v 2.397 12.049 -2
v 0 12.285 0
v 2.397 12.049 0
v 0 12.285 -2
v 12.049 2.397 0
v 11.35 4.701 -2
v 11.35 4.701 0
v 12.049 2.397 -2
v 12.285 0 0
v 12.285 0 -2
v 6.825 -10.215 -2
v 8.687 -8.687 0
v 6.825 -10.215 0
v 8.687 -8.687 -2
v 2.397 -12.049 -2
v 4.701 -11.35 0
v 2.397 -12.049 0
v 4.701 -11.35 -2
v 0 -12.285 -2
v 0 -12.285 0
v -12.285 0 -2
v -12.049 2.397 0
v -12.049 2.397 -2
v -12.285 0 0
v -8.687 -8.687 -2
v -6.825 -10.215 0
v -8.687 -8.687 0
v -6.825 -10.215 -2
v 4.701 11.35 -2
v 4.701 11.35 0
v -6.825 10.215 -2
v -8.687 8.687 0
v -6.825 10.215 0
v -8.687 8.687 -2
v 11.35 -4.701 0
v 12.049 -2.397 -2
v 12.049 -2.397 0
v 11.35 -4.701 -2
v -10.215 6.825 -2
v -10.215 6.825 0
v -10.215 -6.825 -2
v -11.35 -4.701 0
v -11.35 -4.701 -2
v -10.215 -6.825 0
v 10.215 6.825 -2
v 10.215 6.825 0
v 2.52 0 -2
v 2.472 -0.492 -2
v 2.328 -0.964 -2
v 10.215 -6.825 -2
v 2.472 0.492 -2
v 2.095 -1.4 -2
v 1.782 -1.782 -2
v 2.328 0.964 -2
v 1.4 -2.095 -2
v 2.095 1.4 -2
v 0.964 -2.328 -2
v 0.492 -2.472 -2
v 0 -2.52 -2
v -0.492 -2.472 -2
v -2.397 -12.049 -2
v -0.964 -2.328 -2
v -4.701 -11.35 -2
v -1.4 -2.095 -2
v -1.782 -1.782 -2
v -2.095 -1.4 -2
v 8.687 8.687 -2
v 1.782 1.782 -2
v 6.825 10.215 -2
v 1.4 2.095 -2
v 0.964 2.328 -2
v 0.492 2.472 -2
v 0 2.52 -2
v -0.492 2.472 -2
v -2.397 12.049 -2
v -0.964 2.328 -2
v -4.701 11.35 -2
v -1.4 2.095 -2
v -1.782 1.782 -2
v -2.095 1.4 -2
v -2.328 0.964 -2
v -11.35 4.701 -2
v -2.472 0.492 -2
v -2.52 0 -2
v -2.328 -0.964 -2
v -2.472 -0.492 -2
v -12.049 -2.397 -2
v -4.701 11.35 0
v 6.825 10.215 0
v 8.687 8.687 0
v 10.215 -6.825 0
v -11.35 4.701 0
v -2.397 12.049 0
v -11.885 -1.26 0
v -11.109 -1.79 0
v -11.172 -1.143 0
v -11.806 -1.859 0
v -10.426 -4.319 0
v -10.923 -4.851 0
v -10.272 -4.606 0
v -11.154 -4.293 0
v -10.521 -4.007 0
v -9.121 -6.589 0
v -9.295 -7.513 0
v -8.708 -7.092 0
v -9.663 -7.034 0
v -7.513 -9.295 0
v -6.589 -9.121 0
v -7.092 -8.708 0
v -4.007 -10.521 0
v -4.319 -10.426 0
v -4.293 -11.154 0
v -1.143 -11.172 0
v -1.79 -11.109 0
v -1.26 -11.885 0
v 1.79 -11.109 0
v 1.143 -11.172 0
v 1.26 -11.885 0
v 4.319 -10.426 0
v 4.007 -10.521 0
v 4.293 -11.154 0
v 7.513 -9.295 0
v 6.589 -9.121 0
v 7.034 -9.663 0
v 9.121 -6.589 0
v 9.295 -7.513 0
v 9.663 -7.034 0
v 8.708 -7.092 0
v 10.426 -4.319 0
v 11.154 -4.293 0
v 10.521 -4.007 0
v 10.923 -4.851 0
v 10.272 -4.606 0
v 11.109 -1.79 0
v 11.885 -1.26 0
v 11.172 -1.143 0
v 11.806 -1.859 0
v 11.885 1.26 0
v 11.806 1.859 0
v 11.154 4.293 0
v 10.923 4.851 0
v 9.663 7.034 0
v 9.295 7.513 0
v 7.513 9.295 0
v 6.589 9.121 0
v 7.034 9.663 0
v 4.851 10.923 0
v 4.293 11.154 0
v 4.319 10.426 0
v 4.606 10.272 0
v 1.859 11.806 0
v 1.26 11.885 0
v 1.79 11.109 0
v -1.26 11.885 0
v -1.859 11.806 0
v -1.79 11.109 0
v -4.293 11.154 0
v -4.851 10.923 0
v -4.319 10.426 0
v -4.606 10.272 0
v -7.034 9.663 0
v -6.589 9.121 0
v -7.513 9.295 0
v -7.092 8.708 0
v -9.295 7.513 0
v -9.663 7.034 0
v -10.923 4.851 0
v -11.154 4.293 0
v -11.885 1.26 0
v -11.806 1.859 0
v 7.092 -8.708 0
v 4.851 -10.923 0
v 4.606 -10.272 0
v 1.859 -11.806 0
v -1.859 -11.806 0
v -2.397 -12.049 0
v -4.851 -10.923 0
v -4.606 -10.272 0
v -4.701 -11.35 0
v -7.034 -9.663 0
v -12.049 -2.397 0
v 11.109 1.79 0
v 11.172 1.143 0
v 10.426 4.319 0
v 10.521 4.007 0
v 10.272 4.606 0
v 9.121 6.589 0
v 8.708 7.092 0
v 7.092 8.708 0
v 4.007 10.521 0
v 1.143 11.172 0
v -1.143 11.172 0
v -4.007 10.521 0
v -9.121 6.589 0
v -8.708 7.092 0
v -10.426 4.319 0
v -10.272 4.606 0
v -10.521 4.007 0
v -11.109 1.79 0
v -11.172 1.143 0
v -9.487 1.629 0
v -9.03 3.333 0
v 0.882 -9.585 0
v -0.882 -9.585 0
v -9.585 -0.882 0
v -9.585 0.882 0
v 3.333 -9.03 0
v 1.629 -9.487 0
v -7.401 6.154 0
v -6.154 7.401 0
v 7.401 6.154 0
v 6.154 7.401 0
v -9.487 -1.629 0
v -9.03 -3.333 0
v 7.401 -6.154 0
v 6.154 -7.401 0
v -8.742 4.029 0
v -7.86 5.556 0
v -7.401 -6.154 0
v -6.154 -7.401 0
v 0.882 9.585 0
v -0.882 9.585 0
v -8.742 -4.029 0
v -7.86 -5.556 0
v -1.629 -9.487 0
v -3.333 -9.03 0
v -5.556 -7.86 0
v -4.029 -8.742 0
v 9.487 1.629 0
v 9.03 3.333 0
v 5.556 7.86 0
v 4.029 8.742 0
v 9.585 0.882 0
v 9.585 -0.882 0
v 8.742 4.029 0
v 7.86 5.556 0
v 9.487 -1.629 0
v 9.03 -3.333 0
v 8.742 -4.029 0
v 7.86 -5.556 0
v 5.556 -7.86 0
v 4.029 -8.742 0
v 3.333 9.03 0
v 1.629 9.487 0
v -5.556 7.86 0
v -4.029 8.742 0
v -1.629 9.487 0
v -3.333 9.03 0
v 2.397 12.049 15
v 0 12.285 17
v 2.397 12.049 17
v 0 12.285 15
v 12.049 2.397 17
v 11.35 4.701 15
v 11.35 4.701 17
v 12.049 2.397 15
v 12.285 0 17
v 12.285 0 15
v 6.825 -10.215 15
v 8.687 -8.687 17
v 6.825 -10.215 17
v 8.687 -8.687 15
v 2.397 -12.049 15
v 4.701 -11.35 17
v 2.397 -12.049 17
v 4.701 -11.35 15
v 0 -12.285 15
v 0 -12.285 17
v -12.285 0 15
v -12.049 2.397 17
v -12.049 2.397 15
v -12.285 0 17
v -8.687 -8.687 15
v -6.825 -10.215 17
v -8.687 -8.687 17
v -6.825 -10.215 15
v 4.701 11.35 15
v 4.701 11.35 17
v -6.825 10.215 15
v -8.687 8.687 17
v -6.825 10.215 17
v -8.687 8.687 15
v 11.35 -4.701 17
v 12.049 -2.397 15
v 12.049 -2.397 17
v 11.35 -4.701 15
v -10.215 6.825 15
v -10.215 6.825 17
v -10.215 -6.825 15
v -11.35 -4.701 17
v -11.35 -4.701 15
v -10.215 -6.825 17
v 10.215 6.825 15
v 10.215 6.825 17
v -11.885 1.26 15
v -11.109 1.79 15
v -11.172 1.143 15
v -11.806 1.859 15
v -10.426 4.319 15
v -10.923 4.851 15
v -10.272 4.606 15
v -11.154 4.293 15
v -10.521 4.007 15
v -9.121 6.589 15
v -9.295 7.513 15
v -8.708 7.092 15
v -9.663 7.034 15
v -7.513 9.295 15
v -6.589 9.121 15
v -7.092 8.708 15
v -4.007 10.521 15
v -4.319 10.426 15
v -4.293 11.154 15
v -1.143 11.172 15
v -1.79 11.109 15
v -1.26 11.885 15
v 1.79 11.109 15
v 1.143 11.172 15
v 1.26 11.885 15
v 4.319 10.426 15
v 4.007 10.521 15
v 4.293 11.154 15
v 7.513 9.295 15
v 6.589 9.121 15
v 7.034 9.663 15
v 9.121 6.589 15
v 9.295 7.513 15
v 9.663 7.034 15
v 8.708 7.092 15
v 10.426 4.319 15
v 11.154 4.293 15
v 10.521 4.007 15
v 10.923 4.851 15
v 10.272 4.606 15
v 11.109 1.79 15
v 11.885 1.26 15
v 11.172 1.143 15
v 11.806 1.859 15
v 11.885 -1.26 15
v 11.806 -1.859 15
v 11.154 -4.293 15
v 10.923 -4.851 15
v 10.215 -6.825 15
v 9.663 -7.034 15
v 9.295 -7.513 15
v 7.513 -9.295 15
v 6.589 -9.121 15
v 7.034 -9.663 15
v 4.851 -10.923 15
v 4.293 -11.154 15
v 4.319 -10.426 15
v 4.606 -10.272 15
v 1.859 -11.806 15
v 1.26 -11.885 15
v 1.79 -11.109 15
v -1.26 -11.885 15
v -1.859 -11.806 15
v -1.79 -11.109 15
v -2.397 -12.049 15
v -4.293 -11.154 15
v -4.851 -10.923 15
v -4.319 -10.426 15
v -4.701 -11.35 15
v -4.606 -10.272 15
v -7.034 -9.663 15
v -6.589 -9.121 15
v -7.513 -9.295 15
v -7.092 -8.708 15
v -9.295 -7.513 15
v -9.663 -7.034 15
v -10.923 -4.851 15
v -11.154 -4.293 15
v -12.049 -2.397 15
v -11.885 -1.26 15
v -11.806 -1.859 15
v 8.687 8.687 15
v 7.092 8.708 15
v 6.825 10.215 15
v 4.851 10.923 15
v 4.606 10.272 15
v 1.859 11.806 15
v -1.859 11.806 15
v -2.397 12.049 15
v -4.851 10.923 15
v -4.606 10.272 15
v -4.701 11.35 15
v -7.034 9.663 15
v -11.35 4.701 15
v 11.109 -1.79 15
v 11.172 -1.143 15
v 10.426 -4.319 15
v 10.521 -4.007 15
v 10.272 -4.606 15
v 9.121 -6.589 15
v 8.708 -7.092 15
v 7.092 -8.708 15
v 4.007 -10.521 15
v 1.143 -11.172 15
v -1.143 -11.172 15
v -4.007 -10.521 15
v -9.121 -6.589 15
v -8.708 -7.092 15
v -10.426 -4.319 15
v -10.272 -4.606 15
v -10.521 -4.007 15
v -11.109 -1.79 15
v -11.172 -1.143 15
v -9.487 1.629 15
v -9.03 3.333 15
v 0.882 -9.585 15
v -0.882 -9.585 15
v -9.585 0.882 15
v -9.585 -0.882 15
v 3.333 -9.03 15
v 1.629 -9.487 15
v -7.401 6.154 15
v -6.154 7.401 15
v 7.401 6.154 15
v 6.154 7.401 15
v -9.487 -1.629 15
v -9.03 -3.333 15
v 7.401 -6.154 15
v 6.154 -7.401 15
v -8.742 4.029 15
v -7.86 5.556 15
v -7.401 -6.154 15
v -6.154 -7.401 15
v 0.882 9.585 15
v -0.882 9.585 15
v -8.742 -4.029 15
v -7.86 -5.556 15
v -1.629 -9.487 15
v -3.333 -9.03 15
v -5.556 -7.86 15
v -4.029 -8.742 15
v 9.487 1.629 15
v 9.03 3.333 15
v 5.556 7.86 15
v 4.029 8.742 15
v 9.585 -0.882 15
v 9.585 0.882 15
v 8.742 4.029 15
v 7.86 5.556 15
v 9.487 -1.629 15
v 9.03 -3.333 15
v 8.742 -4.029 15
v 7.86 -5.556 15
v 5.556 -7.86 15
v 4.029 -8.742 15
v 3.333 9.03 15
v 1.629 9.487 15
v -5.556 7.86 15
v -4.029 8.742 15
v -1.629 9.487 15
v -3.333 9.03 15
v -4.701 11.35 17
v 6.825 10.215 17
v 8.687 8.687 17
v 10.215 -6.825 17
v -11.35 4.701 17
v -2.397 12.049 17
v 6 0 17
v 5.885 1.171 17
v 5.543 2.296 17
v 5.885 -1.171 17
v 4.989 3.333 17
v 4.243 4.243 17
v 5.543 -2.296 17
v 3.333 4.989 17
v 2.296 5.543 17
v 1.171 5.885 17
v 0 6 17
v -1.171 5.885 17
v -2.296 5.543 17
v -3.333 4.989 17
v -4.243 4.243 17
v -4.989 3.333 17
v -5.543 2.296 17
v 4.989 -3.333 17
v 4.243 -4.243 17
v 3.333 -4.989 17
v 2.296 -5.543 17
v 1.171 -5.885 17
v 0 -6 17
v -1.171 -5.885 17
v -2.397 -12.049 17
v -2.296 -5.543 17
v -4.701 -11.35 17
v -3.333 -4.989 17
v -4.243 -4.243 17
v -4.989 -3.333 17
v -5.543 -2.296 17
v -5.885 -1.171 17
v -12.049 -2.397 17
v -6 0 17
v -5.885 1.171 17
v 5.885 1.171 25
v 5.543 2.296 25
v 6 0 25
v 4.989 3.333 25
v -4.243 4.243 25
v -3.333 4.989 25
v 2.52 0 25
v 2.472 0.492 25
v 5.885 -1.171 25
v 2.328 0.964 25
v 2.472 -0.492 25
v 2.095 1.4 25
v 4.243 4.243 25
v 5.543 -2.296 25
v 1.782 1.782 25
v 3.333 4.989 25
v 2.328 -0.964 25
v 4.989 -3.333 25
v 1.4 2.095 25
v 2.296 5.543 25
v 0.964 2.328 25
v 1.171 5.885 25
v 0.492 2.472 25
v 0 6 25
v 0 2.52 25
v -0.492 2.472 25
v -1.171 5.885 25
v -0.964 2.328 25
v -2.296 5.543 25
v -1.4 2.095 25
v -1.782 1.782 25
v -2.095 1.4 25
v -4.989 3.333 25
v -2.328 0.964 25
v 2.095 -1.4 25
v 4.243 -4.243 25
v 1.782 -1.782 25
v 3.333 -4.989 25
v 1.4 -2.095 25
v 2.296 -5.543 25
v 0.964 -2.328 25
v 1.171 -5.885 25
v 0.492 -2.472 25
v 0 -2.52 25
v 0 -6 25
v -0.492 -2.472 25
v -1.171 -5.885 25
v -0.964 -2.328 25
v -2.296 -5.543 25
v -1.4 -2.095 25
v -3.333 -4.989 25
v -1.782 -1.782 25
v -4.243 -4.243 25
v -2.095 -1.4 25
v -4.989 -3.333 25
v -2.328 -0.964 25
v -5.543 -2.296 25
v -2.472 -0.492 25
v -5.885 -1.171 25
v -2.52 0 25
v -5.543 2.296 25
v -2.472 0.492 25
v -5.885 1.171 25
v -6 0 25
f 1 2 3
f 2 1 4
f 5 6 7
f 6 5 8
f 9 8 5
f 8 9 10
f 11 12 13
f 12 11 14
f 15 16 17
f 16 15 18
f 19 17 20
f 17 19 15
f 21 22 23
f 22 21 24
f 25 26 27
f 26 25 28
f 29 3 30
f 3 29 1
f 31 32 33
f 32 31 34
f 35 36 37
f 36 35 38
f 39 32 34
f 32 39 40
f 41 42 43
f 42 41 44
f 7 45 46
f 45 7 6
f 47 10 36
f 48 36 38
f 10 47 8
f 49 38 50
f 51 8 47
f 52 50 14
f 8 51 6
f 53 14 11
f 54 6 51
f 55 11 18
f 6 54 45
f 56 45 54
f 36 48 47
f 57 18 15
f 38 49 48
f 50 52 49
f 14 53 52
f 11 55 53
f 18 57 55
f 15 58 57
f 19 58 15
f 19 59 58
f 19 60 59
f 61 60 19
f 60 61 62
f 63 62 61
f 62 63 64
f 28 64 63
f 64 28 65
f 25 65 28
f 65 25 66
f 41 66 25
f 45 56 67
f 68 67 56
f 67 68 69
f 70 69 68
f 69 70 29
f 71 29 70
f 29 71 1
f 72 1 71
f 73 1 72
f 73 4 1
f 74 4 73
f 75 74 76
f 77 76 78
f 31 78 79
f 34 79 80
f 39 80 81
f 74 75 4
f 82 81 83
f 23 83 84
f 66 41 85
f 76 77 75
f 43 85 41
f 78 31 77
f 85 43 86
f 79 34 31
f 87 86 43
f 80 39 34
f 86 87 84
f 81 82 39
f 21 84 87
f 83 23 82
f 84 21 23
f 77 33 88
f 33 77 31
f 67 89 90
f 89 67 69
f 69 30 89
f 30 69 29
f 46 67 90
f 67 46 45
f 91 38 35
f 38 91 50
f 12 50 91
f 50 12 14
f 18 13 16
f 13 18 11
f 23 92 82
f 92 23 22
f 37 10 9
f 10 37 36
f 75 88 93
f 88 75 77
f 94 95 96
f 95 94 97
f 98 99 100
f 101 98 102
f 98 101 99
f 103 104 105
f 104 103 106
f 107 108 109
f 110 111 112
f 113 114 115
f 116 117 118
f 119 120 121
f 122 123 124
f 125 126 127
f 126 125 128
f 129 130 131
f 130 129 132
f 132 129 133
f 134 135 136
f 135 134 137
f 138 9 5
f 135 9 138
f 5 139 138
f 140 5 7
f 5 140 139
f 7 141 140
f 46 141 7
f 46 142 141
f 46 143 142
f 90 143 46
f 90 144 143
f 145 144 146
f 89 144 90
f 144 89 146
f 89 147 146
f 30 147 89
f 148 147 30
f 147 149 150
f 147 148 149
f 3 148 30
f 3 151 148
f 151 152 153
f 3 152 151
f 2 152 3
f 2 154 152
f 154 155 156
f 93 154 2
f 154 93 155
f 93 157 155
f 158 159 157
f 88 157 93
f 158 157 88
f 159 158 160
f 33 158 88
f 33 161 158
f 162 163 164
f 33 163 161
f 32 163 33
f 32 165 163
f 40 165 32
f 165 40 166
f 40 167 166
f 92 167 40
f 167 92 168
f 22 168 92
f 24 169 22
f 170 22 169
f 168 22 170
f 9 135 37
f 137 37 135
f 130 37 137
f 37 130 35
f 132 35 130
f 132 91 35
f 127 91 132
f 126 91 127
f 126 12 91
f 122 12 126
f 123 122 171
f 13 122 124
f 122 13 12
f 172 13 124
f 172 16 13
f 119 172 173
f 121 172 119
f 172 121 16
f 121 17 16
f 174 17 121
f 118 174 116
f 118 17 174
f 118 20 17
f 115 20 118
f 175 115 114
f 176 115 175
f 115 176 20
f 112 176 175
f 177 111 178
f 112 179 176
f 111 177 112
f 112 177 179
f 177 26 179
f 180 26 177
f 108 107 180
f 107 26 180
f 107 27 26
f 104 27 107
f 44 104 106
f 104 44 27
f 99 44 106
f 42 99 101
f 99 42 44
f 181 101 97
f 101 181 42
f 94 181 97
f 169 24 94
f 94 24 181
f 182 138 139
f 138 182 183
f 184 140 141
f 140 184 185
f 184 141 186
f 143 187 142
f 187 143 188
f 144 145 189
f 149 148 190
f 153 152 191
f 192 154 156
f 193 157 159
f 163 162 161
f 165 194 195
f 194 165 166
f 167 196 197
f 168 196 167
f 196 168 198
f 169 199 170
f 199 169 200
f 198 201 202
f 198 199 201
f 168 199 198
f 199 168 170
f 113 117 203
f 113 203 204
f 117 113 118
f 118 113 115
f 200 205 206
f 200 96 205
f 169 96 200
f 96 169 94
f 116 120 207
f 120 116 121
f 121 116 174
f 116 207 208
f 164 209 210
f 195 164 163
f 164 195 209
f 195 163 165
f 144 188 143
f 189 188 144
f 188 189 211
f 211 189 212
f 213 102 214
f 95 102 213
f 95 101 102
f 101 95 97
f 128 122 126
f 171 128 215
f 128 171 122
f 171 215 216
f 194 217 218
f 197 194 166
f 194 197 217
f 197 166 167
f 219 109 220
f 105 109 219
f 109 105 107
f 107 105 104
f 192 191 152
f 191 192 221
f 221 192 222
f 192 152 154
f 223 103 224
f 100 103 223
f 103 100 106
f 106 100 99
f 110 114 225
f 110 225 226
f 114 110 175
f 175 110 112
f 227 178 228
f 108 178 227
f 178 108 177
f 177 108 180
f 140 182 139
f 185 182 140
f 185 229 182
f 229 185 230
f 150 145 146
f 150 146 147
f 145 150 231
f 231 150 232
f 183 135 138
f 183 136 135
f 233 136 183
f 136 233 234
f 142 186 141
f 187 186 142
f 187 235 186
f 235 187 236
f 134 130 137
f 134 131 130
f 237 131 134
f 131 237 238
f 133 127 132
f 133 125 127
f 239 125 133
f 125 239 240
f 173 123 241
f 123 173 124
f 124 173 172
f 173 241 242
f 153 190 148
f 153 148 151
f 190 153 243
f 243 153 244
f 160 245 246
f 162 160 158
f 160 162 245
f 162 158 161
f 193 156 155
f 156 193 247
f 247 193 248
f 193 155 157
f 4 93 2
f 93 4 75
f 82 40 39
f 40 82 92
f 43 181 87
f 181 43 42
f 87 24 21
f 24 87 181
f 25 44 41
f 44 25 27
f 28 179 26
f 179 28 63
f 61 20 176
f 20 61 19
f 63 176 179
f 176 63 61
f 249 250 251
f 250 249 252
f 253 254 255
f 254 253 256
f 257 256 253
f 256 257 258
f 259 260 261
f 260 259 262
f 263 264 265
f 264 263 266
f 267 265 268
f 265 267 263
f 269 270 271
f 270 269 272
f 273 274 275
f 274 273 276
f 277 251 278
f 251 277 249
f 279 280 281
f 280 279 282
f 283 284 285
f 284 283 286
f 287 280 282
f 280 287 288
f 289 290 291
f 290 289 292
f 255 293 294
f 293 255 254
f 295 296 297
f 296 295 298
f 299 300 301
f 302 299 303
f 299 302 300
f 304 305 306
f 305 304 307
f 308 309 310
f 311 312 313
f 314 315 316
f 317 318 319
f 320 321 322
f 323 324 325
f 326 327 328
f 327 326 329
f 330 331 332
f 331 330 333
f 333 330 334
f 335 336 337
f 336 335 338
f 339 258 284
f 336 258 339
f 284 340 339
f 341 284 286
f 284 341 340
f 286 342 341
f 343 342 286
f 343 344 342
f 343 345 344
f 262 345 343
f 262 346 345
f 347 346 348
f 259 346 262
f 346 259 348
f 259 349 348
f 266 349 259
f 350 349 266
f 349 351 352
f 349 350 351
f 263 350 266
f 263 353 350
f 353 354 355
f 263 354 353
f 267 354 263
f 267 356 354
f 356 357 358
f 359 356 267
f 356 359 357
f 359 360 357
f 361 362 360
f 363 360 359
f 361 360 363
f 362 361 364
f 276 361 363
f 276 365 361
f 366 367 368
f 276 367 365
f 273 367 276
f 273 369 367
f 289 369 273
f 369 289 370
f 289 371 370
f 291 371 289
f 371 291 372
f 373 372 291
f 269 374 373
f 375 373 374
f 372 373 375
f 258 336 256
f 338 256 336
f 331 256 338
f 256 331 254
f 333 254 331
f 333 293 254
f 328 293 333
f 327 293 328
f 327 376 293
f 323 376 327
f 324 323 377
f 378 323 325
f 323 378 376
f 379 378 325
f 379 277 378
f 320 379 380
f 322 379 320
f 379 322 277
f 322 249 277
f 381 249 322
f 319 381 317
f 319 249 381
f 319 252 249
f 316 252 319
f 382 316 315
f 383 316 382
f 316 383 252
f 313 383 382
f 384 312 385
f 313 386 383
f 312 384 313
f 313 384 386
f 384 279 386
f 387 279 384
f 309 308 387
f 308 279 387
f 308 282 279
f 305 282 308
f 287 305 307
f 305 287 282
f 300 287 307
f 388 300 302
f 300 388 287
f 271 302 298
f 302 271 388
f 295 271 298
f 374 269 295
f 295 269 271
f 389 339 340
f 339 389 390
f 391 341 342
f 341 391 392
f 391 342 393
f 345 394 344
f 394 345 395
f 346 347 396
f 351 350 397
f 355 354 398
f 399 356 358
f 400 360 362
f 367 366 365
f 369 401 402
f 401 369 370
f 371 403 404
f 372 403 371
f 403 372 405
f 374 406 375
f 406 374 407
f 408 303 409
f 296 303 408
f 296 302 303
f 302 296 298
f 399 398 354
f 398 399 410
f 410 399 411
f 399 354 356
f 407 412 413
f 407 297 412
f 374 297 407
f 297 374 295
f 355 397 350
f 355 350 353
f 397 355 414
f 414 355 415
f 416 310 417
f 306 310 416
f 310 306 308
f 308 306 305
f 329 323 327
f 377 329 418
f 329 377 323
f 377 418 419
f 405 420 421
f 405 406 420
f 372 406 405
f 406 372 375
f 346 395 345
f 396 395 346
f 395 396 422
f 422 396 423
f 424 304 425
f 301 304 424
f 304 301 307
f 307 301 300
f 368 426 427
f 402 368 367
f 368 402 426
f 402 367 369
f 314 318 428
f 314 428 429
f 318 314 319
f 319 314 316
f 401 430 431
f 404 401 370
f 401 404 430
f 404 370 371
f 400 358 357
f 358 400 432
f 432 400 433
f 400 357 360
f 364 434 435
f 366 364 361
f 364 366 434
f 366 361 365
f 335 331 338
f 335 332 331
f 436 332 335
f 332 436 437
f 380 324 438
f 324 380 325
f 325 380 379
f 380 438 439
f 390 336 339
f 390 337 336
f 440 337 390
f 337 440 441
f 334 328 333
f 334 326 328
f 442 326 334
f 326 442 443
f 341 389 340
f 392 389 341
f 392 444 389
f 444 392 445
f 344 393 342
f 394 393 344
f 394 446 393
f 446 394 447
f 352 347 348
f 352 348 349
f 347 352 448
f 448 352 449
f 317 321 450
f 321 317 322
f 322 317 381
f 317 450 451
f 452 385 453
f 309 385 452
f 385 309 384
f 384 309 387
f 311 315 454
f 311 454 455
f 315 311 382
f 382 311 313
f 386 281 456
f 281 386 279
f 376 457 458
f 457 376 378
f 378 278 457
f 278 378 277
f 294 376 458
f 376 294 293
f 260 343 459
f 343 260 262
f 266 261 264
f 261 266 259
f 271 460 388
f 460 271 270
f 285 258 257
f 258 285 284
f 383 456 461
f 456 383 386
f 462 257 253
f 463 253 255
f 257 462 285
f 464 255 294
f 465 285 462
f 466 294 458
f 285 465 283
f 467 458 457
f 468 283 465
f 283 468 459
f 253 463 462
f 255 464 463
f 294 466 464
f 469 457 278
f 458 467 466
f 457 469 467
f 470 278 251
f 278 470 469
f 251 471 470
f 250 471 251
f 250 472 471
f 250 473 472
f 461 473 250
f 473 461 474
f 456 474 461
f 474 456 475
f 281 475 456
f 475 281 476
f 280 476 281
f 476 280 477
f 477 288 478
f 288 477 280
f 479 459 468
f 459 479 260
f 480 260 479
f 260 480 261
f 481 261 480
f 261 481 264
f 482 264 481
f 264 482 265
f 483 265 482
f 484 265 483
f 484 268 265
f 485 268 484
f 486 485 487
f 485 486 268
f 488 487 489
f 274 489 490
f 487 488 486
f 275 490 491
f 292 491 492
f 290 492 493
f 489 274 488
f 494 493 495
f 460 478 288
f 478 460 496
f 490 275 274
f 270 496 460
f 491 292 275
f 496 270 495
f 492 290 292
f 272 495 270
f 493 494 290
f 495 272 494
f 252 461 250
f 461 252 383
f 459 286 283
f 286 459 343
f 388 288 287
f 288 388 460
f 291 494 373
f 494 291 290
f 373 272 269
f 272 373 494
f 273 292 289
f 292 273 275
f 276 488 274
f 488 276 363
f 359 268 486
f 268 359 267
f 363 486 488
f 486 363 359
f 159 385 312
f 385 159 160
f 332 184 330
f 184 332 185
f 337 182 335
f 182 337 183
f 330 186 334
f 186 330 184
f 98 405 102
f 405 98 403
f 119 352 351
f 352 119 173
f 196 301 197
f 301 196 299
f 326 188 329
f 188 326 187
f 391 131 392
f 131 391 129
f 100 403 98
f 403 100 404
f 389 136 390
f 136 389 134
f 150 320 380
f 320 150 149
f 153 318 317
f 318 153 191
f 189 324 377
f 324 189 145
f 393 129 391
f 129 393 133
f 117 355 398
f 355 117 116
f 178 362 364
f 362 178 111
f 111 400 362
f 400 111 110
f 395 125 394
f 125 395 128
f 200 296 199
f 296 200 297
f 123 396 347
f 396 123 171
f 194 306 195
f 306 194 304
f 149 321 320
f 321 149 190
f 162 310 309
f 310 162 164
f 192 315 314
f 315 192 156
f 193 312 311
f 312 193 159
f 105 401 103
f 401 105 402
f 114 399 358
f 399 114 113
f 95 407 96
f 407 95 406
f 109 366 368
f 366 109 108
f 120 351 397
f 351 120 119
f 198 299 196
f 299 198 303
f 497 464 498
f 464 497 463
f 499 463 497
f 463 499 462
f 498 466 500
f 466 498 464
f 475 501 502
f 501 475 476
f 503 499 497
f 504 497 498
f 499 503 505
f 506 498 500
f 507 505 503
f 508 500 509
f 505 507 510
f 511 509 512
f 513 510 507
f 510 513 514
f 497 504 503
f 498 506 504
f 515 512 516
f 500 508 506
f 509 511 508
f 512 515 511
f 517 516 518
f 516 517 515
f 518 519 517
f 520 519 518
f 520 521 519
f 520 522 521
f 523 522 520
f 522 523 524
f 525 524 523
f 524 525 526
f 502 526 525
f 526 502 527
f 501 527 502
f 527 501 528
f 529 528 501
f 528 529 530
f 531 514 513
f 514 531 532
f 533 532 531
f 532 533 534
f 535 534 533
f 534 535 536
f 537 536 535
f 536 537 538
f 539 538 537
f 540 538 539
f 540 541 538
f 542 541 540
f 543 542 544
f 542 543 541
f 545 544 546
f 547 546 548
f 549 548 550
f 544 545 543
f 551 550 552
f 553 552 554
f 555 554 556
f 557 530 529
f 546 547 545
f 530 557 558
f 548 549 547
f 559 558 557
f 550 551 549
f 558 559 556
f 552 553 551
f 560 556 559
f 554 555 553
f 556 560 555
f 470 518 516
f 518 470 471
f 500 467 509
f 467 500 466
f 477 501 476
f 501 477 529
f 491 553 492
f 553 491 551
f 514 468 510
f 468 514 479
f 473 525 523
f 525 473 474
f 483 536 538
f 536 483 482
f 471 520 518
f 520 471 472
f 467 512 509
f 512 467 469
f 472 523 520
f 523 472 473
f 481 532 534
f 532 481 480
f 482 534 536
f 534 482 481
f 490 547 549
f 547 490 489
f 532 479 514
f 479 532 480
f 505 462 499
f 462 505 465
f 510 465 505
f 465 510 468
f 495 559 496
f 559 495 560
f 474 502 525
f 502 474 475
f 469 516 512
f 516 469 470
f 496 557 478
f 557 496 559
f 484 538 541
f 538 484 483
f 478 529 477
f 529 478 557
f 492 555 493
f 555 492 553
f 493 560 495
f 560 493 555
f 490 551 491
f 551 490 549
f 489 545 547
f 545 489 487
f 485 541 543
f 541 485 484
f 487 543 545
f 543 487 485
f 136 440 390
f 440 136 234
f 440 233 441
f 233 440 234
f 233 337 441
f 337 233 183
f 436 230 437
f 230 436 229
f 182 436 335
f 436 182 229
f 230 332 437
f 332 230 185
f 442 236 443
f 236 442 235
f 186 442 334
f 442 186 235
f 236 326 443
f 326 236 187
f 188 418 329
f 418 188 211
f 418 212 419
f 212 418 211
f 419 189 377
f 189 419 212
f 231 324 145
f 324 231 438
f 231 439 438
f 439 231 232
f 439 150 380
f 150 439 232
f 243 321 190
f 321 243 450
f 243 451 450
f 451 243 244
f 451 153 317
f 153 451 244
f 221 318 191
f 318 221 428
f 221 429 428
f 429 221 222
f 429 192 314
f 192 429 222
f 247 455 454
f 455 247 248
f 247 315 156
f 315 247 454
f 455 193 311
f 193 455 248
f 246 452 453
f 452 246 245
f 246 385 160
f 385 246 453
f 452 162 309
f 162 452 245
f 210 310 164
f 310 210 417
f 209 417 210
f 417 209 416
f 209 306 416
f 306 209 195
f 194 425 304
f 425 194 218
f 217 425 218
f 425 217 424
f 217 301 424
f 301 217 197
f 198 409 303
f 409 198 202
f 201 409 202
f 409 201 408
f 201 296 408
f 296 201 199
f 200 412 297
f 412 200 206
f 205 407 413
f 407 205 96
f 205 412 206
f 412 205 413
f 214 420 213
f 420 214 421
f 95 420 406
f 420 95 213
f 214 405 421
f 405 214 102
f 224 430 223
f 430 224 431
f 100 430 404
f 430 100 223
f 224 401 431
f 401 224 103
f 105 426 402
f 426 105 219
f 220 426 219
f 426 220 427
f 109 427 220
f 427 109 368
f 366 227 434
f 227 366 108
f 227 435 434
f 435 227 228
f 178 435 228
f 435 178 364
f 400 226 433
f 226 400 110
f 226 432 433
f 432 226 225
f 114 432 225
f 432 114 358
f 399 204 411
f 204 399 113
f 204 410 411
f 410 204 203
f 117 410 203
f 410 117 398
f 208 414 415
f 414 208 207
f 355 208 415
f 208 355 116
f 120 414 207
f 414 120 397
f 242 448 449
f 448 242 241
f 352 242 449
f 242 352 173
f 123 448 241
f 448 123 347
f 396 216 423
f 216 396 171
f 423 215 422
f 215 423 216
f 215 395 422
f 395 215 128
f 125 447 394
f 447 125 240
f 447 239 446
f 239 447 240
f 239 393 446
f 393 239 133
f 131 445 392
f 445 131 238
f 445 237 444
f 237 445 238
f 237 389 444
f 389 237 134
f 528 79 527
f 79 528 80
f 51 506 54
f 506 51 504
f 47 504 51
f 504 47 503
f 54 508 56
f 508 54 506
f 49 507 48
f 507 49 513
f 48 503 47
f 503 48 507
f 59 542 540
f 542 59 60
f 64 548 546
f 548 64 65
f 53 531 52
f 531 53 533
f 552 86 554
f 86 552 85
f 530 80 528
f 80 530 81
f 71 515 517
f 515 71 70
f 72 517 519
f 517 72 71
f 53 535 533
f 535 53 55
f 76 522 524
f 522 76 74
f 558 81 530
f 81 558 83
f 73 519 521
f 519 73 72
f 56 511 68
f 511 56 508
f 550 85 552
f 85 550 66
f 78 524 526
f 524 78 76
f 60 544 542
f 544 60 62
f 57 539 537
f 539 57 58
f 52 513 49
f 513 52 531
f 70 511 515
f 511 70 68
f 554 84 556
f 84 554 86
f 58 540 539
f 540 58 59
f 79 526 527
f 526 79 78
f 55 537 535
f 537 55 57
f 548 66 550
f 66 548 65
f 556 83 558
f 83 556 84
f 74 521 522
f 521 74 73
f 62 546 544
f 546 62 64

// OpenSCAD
$fn = 32;

// ----------------------------------------------------------------------
// Timing pulley: GT3 24T, pitch 3 mm, 24.57 mm x 27 mm
// ----------------------------------------------------------------------

// --- parameters (mm) ---
pitch_mm = 3;             // belt pitch
tooth_count = 24;         // number of grooves
width = 15;               // belt width between the flanges
tip_d = 22.57;            // tip circle diameter
root_d = 20.37;           // groove bottom diameter
groove_h = 1.1;           // groove depth
tooth_w = 2.1;            // groove width at the tip circle
side_d = 24.57;           // flange diameter
side_t = 2;               // flange thickness
spigot_d = 18.77;         // flange spigot, sunk into the rim
spigot_h = 1.2;           // spigot depth into the rim
hub_bore = 5.04;          // shaft bore
hub_d = 12;               // hub diameter
hub_h = 8;                // hub above the flange
bottom_z = -2;            // lowest point of the pulley
top_z = 25;               // highest point of the pulley

module rim() {
  cylinder(h = width, d = tip_d);
}

module groove_cutter() {
  /* belt tooth groove: deeper than wide, cut through the belt width */
  translate([root_d / 2, 0, 0])
    linear_extrude(height = width)
      polygon(points = [[-0.6, -tooth_w * 0.42], [groove_h + 0.6, -tooth_w * 0.6],
                        [groove_h + 0.6, tooth_w * 0.6], [-0.6, tooth_w * 0.42]]);
}

module flanges() {
  translate([0, 0, -side_t]) cylinder(h = side_t, d = side_d);
  translate([0, 0, width]) cylinder(h = side_t, d = side_d);
  translate([0, 0, -spigot_h]) cylinder(h = spigot_h + 0.6, d = spigot_d);
  translate([0, 0, width - 0.6]) cylinder(h = spigot_h + 0.6, d = spigot_d);
}

module hub() {
  translate([0, 0, bottom_z]) cylinder(h = top_z - bottom_z, d = hub_d);
}

difference() {
  union() {
    rim();
    hub();
    flanges();
  }
  for (i = [0 : tooth_count - 1]) rotate([0, 0, i * 360 / tooth_count]) groove_cutter();
  translate([0, 0, bottom_z - 1]) cylinder(h = top_z - bottom_z + 2, d = hub_bore);
}
